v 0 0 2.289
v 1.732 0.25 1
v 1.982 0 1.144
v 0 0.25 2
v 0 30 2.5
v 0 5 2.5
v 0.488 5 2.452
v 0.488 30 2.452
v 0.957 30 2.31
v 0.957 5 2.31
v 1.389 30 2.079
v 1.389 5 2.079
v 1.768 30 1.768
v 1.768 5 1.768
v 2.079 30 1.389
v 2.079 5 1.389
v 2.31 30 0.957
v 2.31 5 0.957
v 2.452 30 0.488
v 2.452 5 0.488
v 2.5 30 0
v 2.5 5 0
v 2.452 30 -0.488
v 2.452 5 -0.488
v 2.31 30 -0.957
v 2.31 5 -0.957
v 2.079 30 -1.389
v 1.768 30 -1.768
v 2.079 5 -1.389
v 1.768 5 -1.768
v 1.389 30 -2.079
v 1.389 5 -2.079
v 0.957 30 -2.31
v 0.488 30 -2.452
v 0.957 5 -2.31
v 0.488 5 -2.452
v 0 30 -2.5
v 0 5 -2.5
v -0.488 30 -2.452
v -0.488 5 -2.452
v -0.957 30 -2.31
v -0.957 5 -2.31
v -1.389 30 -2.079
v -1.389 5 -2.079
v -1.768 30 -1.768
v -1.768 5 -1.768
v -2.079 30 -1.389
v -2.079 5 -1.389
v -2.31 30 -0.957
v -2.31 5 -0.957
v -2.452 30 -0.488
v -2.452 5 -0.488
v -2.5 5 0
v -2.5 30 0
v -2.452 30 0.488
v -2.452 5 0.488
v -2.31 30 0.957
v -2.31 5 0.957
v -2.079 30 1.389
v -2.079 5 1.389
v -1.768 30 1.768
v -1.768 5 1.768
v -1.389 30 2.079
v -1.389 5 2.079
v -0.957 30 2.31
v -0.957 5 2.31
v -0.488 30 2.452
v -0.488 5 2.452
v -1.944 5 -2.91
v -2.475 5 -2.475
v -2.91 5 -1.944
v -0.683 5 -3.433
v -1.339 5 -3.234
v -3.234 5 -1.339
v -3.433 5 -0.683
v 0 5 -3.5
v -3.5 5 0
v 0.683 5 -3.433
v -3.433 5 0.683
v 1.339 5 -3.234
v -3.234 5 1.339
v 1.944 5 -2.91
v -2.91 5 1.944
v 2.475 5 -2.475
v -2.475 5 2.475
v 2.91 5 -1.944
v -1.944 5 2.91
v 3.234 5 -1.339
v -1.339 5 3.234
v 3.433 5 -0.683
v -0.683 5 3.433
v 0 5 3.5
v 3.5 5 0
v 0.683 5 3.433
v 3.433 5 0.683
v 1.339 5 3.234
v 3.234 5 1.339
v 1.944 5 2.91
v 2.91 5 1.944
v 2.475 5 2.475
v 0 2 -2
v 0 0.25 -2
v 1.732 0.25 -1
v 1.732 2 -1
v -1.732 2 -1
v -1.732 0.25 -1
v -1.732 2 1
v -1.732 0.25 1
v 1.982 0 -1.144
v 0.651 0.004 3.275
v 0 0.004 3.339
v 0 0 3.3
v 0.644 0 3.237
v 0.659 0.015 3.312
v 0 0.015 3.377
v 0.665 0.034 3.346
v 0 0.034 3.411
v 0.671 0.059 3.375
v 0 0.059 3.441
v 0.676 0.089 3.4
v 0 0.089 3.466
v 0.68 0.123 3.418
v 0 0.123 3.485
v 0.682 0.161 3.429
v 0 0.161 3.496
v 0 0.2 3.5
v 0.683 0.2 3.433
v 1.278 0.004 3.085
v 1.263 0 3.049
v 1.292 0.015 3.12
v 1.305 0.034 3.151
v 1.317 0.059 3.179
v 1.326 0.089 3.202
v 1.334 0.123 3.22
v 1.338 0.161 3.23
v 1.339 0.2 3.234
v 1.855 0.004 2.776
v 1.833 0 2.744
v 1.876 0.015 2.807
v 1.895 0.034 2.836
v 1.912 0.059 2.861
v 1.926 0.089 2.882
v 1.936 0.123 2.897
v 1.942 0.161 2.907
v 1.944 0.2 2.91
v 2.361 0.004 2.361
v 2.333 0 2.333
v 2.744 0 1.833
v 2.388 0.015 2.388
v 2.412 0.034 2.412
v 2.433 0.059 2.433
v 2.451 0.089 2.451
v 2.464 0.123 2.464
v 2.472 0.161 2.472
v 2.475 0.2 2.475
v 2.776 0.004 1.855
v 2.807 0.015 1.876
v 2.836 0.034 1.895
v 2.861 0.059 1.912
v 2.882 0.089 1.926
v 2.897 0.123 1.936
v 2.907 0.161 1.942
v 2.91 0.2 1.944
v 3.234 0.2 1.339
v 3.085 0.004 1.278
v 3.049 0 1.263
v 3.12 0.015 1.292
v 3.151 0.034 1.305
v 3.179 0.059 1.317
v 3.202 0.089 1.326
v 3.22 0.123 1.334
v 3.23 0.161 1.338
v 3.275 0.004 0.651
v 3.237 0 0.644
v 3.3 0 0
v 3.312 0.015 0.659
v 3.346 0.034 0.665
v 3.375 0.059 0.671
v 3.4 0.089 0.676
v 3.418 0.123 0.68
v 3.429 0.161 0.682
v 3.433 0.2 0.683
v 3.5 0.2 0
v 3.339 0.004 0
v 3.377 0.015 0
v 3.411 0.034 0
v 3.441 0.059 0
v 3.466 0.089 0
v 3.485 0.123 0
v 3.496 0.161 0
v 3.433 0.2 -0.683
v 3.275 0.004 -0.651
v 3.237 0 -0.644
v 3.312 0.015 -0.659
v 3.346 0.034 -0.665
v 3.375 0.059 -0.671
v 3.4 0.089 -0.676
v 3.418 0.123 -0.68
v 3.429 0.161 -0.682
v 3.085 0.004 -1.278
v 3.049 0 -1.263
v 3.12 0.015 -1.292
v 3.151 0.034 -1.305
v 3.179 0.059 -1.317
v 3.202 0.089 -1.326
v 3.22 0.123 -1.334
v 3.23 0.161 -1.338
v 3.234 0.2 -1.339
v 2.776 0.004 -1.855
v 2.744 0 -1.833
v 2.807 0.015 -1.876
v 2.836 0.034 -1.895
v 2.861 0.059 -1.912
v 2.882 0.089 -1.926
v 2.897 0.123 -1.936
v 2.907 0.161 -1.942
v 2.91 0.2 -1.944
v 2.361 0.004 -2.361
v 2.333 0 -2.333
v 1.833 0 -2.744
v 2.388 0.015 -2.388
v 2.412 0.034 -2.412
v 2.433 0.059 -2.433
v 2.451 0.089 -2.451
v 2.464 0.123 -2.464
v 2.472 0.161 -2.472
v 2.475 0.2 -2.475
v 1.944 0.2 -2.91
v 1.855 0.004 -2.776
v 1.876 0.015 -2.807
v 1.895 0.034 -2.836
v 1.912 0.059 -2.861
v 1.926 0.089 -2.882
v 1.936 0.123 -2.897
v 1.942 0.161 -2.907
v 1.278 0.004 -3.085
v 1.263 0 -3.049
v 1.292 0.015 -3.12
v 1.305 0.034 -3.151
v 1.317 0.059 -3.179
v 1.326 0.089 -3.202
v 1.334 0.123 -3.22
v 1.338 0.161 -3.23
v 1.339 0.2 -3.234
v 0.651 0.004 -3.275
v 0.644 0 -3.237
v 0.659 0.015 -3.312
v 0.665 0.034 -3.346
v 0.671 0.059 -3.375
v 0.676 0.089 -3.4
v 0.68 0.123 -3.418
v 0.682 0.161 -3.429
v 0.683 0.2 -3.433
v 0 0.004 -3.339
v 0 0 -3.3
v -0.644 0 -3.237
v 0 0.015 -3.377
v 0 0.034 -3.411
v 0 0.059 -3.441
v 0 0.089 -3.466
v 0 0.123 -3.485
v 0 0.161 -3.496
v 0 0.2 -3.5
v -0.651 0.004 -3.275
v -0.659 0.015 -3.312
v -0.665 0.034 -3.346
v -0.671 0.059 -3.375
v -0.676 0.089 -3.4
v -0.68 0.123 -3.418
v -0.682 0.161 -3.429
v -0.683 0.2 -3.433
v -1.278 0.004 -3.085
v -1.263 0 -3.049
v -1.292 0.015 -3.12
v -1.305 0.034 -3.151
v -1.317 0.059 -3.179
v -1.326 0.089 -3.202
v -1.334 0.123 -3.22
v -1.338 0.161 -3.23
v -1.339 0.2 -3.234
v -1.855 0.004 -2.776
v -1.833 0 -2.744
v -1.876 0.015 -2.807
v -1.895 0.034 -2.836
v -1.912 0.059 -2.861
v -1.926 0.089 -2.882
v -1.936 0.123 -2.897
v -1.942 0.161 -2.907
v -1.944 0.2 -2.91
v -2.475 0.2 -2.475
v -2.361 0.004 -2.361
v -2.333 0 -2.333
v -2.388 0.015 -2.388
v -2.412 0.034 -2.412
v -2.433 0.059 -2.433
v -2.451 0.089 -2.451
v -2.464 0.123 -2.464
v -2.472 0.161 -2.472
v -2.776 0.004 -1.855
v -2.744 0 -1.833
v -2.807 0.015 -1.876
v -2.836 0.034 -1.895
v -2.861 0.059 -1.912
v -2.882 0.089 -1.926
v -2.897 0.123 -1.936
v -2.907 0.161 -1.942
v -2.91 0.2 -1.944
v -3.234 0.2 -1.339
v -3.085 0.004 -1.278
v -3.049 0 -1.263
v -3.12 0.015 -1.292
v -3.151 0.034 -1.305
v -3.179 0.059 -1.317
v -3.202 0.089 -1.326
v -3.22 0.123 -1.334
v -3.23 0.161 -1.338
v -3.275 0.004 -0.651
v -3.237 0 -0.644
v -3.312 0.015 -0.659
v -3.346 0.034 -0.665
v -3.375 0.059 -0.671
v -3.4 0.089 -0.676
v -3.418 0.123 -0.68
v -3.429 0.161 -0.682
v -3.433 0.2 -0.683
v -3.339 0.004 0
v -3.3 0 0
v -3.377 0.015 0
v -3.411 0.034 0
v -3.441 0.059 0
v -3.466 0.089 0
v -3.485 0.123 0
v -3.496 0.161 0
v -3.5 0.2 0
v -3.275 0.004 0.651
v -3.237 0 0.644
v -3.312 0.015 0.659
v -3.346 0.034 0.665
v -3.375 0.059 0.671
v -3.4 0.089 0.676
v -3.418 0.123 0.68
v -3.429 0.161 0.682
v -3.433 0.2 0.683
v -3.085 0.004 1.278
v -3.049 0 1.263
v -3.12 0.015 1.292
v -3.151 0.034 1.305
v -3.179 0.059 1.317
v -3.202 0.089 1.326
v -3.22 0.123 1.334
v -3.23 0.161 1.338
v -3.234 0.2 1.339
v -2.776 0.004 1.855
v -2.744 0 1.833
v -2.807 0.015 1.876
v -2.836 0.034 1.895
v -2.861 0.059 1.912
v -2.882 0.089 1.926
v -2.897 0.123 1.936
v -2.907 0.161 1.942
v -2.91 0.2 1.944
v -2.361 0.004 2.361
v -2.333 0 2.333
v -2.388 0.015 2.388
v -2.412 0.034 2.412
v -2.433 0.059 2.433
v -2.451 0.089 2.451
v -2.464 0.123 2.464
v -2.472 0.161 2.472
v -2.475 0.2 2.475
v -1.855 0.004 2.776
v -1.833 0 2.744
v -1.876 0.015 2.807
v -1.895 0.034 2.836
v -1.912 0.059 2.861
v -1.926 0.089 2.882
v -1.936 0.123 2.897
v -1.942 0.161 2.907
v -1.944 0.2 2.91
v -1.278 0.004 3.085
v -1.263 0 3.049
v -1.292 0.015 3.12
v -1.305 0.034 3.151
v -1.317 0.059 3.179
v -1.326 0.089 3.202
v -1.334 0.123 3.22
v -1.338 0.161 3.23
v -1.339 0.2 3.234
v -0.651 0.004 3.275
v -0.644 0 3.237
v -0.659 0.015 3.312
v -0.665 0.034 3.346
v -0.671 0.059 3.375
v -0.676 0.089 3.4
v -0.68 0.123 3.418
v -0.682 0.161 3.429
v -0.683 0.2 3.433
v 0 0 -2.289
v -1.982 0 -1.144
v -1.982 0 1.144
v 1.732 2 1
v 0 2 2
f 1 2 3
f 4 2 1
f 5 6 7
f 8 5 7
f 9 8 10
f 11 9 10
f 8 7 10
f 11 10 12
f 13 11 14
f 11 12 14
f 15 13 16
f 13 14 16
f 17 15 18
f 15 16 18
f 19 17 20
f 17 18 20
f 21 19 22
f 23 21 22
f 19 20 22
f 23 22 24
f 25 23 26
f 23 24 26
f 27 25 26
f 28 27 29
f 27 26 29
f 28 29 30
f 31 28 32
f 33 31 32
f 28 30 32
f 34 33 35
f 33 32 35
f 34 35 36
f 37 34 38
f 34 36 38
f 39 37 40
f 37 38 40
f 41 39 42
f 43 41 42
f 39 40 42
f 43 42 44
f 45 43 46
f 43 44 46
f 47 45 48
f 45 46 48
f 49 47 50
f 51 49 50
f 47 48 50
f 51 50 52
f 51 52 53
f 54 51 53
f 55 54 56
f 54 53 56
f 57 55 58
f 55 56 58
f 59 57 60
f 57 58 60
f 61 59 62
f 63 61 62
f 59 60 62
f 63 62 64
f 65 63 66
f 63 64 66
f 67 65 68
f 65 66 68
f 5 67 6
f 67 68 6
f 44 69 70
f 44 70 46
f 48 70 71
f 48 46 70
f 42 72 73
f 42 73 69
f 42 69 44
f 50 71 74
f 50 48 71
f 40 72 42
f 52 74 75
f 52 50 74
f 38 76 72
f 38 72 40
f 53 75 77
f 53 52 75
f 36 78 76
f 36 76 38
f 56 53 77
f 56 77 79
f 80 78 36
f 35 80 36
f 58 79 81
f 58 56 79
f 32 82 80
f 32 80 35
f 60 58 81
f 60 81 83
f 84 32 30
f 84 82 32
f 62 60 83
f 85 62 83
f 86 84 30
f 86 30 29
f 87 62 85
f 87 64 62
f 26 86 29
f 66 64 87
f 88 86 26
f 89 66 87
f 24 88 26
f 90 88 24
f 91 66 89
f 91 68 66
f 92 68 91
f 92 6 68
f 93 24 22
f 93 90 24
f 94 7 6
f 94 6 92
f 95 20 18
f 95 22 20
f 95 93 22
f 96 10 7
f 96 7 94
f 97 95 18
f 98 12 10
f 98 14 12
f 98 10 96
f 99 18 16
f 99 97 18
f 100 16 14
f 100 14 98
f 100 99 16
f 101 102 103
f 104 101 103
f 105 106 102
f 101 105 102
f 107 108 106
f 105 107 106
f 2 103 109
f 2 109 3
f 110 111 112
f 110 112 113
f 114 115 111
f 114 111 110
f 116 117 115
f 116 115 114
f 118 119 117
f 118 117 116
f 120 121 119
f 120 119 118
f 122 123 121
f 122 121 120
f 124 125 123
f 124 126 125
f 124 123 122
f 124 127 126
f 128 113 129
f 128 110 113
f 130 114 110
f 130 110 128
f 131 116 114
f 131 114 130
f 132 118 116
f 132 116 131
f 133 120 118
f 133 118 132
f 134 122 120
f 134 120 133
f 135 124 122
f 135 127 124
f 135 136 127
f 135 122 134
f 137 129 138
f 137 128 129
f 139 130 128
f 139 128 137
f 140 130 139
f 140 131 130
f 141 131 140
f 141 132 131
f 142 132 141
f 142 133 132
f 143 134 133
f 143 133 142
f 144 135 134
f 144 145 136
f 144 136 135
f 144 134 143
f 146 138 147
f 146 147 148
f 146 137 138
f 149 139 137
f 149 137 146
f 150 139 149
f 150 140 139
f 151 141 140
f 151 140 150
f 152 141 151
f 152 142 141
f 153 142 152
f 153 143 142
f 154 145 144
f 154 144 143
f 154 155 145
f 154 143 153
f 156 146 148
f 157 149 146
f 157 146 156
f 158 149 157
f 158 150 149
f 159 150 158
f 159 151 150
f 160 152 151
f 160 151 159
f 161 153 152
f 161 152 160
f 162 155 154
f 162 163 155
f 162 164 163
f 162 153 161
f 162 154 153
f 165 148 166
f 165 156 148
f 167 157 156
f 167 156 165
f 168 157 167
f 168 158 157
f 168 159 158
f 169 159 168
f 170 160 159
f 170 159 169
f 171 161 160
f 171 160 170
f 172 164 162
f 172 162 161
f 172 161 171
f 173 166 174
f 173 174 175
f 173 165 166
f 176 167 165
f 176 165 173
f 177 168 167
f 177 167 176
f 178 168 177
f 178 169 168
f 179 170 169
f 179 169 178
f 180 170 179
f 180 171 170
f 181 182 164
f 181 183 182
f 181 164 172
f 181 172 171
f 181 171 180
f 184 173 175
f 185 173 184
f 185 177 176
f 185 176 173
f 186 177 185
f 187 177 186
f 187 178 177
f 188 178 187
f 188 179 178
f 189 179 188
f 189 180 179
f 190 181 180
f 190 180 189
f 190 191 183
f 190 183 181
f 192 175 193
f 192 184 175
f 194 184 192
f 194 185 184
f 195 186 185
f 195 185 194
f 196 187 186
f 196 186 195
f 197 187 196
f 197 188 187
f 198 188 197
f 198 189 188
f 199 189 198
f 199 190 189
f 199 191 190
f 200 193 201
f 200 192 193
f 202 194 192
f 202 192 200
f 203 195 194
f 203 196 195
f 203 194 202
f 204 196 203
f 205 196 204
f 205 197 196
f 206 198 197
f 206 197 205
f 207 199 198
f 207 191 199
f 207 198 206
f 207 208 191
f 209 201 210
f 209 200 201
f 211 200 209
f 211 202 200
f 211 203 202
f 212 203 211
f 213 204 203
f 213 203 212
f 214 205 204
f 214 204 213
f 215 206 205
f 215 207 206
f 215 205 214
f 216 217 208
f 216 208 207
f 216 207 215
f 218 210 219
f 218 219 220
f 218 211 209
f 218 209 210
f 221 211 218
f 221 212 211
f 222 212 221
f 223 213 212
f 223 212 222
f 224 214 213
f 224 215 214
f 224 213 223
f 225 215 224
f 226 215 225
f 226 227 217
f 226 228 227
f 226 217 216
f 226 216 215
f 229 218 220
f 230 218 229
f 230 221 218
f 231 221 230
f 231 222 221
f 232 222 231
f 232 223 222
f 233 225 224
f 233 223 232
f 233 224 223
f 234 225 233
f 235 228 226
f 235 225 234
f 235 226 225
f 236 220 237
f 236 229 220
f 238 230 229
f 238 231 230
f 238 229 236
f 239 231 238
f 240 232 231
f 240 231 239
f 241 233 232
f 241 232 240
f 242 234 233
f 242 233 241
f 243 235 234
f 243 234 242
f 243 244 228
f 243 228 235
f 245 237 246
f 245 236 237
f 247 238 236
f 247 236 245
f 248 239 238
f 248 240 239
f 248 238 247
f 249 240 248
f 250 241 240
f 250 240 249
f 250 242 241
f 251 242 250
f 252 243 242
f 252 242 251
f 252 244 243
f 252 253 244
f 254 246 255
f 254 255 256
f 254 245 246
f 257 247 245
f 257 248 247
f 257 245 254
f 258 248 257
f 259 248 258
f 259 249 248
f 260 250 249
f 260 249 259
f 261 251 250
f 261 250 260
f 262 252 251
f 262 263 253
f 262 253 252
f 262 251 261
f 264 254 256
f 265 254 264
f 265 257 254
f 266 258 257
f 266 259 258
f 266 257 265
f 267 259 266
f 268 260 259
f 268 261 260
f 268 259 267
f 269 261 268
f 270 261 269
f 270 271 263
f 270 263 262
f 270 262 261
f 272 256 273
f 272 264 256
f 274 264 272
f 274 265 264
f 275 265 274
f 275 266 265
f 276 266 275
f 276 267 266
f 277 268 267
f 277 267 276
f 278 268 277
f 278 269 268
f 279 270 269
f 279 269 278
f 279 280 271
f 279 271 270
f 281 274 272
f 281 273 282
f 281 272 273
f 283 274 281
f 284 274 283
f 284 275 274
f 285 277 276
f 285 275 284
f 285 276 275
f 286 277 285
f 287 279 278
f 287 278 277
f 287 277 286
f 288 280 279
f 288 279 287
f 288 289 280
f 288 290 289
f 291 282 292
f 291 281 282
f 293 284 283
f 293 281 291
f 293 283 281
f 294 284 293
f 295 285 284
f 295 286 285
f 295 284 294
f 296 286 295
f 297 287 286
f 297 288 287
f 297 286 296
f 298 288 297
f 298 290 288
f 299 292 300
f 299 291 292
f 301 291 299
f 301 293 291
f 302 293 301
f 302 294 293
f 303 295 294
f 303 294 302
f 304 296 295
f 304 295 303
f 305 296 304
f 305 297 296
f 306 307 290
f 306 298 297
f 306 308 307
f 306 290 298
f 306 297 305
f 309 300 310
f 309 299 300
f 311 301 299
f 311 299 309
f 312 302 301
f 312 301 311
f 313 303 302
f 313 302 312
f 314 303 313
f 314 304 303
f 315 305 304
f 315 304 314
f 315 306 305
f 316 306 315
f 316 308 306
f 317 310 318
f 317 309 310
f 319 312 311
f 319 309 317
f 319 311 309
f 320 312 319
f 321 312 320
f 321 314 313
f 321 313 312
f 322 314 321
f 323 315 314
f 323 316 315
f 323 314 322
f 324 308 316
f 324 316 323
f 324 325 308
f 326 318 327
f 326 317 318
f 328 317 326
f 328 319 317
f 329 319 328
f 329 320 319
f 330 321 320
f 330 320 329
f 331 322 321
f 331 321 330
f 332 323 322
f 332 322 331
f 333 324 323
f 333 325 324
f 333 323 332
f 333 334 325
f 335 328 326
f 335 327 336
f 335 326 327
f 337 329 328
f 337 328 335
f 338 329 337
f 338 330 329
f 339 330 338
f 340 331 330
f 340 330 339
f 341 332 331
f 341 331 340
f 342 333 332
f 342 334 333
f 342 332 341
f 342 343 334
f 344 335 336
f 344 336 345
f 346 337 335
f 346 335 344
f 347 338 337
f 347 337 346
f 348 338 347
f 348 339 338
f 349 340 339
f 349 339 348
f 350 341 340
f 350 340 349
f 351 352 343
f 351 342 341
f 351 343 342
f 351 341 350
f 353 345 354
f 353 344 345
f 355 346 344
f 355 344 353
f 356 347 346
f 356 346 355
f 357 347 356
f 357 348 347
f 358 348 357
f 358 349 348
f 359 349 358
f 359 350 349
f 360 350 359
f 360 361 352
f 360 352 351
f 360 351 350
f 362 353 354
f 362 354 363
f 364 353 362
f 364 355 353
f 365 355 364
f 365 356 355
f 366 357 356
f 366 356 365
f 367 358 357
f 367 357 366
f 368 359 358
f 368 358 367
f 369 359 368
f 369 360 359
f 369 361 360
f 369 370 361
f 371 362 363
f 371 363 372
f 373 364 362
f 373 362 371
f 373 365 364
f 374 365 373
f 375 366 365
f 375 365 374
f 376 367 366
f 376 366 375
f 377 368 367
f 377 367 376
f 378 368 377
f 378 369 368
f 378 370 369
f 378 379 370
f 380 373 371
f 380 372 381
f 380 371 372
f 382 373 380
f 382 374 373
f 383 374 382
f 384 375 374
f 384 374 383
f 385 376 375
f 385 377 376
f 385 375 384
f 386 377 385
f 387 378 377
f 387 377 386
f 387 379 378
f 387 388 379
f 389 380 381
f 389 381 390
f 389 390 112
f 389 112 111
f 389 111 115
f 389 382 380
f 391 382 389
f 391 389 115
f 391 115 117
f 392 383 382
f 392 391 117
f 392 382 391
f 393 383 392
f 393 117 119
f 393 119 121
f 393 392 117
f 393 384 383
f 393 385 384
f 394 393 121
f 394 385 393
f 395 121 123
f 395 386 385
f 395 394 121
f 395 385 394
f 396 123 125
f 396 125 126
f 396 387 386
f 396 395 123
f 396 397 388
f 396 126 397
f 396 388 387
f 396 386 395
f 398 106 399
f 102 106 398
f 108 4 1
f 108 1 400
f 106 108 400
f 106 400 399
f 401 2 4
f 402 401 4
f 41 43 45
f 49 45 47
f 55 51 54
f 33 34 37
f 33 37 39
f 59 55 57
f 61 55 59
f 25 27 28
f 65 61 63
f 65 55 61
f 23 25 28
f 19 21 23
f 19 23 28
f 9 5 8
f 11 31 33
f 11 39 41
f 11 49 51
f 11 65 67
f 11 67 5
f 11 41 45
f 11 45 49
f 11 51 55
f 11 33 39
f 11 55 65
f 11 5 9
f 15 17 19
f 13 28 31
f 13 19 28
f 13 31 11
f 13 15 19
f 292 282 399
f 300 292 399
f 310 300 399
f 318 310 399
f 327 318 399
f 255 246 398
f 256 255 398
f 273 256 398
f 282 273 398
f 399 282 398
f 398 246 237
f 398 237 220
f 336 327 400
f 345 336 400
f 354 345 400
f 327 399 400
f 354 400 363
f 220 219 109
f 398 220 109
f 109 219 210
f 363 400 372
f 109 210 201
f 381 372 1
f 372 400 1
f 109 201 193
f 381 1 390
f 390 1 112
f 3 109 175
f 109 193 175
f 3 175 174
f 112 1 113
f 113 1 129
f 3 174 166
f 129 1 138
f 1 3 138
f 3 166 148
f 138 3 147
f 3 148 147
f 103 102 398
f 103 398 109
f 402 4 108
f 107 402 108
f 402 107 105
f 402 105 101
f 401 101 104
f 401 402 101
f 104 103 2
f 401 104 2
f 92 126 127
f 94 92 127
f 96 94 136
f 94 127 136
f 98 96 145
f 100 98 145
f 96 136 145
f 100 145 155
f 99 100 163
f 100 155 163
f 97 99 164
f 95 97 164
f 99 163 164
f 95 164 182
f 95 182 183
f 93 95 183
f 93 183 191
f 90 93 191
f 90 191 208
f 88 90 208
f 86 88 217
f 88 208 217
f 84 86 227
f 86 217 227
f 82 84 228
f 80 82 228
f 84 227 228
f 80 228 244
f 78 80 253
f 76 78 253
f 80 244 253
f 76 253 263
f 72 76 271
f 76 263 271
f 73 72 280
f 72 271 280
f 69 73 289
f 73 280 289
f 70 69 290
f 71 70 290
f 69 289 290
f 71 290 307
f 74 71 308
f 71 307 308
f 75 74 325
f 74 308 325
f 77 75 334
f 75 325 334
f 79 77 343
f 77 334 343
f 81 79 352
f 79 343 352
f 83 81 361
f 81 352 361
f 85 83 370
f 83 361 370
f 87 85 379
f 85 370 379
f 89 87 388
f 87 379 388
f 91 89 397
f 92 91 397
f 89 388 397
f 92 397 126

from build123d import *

# Parameters (mm, degrees)
SKETCH1_R           = 3.5
BOSS_EXTRUDE1_DEPTH = 5
SKETCH2_R           = 2.5
BOSS_EXTRUDE2_DEPTH = 25
CUT_EXTRUDE1_DEPTH  = 2
CHAMFER1_SIZE       = 0.25
FILLET1_R           = 0.2


with BuildPart() as part:
    # Sketch1 → Boss-Extrude1 (new body)
    with BuildSketch(Plane(origin=(0, 0, 0), x_dir=(1, 0, 0), z_dir=(0, 1, 0))):
        with Locations(Location((0, 0, 0), (0, 0, 270))):
            Circle(SKETCH1_R)
    extrude(amount=BOSS_EXTRUDE1_DEPTH)

    # Sketch2 → Boss-Extrude2 (add)
    with BuildSketch(Plane(origin=(0, 5, 0), x_dir=(1, 0, 0), z_dir=(0, 1, 0))):
        with Locations(Location((0, 0, 0), (0, 0, 270))):
            Circle(SKETCH2_R)
    extrude(amount=BOSS_EXTRUDE2_DEPTH)

    # Sketch3 → Cut-Extrude1 (cut)
    with BuildSketch(Plane.XZ):
        Polygon((0, 2), (-1.732050808, 1), (-1.732050808, -1), (0, -2), (1.732050808, -1), (1.732050808, 1), align=None)
    extrude(amount=-CUT_EXTRUDE1_DEPTH, mode=Mode.SUBTRACT)

    # Chamfer1
    chamfer1_edges = [part.edges().sort_by_distance(p)[0] for p in [
        (0.866025404, 0, 1.5),
        (-0.866025404, 0, 1.5),
        (-1.732050808, 0, 0),
        (-0.866025404, 0, -1.5),
        (0.866025404, 0, -1.5),
        (1.732050808, 0, 0),
    ]]
    chamfer(chamfer1_edges, length=CHAMFER1_SIZE)

    # Fillet1
    fillet1_edges = [part.edges().sort_by_distance(p)[0] for p in [
        (0, 0, -3.5),
    ]]
    fillet(fillet1_edges, radius=FILLET1_R)


solid = part.part
